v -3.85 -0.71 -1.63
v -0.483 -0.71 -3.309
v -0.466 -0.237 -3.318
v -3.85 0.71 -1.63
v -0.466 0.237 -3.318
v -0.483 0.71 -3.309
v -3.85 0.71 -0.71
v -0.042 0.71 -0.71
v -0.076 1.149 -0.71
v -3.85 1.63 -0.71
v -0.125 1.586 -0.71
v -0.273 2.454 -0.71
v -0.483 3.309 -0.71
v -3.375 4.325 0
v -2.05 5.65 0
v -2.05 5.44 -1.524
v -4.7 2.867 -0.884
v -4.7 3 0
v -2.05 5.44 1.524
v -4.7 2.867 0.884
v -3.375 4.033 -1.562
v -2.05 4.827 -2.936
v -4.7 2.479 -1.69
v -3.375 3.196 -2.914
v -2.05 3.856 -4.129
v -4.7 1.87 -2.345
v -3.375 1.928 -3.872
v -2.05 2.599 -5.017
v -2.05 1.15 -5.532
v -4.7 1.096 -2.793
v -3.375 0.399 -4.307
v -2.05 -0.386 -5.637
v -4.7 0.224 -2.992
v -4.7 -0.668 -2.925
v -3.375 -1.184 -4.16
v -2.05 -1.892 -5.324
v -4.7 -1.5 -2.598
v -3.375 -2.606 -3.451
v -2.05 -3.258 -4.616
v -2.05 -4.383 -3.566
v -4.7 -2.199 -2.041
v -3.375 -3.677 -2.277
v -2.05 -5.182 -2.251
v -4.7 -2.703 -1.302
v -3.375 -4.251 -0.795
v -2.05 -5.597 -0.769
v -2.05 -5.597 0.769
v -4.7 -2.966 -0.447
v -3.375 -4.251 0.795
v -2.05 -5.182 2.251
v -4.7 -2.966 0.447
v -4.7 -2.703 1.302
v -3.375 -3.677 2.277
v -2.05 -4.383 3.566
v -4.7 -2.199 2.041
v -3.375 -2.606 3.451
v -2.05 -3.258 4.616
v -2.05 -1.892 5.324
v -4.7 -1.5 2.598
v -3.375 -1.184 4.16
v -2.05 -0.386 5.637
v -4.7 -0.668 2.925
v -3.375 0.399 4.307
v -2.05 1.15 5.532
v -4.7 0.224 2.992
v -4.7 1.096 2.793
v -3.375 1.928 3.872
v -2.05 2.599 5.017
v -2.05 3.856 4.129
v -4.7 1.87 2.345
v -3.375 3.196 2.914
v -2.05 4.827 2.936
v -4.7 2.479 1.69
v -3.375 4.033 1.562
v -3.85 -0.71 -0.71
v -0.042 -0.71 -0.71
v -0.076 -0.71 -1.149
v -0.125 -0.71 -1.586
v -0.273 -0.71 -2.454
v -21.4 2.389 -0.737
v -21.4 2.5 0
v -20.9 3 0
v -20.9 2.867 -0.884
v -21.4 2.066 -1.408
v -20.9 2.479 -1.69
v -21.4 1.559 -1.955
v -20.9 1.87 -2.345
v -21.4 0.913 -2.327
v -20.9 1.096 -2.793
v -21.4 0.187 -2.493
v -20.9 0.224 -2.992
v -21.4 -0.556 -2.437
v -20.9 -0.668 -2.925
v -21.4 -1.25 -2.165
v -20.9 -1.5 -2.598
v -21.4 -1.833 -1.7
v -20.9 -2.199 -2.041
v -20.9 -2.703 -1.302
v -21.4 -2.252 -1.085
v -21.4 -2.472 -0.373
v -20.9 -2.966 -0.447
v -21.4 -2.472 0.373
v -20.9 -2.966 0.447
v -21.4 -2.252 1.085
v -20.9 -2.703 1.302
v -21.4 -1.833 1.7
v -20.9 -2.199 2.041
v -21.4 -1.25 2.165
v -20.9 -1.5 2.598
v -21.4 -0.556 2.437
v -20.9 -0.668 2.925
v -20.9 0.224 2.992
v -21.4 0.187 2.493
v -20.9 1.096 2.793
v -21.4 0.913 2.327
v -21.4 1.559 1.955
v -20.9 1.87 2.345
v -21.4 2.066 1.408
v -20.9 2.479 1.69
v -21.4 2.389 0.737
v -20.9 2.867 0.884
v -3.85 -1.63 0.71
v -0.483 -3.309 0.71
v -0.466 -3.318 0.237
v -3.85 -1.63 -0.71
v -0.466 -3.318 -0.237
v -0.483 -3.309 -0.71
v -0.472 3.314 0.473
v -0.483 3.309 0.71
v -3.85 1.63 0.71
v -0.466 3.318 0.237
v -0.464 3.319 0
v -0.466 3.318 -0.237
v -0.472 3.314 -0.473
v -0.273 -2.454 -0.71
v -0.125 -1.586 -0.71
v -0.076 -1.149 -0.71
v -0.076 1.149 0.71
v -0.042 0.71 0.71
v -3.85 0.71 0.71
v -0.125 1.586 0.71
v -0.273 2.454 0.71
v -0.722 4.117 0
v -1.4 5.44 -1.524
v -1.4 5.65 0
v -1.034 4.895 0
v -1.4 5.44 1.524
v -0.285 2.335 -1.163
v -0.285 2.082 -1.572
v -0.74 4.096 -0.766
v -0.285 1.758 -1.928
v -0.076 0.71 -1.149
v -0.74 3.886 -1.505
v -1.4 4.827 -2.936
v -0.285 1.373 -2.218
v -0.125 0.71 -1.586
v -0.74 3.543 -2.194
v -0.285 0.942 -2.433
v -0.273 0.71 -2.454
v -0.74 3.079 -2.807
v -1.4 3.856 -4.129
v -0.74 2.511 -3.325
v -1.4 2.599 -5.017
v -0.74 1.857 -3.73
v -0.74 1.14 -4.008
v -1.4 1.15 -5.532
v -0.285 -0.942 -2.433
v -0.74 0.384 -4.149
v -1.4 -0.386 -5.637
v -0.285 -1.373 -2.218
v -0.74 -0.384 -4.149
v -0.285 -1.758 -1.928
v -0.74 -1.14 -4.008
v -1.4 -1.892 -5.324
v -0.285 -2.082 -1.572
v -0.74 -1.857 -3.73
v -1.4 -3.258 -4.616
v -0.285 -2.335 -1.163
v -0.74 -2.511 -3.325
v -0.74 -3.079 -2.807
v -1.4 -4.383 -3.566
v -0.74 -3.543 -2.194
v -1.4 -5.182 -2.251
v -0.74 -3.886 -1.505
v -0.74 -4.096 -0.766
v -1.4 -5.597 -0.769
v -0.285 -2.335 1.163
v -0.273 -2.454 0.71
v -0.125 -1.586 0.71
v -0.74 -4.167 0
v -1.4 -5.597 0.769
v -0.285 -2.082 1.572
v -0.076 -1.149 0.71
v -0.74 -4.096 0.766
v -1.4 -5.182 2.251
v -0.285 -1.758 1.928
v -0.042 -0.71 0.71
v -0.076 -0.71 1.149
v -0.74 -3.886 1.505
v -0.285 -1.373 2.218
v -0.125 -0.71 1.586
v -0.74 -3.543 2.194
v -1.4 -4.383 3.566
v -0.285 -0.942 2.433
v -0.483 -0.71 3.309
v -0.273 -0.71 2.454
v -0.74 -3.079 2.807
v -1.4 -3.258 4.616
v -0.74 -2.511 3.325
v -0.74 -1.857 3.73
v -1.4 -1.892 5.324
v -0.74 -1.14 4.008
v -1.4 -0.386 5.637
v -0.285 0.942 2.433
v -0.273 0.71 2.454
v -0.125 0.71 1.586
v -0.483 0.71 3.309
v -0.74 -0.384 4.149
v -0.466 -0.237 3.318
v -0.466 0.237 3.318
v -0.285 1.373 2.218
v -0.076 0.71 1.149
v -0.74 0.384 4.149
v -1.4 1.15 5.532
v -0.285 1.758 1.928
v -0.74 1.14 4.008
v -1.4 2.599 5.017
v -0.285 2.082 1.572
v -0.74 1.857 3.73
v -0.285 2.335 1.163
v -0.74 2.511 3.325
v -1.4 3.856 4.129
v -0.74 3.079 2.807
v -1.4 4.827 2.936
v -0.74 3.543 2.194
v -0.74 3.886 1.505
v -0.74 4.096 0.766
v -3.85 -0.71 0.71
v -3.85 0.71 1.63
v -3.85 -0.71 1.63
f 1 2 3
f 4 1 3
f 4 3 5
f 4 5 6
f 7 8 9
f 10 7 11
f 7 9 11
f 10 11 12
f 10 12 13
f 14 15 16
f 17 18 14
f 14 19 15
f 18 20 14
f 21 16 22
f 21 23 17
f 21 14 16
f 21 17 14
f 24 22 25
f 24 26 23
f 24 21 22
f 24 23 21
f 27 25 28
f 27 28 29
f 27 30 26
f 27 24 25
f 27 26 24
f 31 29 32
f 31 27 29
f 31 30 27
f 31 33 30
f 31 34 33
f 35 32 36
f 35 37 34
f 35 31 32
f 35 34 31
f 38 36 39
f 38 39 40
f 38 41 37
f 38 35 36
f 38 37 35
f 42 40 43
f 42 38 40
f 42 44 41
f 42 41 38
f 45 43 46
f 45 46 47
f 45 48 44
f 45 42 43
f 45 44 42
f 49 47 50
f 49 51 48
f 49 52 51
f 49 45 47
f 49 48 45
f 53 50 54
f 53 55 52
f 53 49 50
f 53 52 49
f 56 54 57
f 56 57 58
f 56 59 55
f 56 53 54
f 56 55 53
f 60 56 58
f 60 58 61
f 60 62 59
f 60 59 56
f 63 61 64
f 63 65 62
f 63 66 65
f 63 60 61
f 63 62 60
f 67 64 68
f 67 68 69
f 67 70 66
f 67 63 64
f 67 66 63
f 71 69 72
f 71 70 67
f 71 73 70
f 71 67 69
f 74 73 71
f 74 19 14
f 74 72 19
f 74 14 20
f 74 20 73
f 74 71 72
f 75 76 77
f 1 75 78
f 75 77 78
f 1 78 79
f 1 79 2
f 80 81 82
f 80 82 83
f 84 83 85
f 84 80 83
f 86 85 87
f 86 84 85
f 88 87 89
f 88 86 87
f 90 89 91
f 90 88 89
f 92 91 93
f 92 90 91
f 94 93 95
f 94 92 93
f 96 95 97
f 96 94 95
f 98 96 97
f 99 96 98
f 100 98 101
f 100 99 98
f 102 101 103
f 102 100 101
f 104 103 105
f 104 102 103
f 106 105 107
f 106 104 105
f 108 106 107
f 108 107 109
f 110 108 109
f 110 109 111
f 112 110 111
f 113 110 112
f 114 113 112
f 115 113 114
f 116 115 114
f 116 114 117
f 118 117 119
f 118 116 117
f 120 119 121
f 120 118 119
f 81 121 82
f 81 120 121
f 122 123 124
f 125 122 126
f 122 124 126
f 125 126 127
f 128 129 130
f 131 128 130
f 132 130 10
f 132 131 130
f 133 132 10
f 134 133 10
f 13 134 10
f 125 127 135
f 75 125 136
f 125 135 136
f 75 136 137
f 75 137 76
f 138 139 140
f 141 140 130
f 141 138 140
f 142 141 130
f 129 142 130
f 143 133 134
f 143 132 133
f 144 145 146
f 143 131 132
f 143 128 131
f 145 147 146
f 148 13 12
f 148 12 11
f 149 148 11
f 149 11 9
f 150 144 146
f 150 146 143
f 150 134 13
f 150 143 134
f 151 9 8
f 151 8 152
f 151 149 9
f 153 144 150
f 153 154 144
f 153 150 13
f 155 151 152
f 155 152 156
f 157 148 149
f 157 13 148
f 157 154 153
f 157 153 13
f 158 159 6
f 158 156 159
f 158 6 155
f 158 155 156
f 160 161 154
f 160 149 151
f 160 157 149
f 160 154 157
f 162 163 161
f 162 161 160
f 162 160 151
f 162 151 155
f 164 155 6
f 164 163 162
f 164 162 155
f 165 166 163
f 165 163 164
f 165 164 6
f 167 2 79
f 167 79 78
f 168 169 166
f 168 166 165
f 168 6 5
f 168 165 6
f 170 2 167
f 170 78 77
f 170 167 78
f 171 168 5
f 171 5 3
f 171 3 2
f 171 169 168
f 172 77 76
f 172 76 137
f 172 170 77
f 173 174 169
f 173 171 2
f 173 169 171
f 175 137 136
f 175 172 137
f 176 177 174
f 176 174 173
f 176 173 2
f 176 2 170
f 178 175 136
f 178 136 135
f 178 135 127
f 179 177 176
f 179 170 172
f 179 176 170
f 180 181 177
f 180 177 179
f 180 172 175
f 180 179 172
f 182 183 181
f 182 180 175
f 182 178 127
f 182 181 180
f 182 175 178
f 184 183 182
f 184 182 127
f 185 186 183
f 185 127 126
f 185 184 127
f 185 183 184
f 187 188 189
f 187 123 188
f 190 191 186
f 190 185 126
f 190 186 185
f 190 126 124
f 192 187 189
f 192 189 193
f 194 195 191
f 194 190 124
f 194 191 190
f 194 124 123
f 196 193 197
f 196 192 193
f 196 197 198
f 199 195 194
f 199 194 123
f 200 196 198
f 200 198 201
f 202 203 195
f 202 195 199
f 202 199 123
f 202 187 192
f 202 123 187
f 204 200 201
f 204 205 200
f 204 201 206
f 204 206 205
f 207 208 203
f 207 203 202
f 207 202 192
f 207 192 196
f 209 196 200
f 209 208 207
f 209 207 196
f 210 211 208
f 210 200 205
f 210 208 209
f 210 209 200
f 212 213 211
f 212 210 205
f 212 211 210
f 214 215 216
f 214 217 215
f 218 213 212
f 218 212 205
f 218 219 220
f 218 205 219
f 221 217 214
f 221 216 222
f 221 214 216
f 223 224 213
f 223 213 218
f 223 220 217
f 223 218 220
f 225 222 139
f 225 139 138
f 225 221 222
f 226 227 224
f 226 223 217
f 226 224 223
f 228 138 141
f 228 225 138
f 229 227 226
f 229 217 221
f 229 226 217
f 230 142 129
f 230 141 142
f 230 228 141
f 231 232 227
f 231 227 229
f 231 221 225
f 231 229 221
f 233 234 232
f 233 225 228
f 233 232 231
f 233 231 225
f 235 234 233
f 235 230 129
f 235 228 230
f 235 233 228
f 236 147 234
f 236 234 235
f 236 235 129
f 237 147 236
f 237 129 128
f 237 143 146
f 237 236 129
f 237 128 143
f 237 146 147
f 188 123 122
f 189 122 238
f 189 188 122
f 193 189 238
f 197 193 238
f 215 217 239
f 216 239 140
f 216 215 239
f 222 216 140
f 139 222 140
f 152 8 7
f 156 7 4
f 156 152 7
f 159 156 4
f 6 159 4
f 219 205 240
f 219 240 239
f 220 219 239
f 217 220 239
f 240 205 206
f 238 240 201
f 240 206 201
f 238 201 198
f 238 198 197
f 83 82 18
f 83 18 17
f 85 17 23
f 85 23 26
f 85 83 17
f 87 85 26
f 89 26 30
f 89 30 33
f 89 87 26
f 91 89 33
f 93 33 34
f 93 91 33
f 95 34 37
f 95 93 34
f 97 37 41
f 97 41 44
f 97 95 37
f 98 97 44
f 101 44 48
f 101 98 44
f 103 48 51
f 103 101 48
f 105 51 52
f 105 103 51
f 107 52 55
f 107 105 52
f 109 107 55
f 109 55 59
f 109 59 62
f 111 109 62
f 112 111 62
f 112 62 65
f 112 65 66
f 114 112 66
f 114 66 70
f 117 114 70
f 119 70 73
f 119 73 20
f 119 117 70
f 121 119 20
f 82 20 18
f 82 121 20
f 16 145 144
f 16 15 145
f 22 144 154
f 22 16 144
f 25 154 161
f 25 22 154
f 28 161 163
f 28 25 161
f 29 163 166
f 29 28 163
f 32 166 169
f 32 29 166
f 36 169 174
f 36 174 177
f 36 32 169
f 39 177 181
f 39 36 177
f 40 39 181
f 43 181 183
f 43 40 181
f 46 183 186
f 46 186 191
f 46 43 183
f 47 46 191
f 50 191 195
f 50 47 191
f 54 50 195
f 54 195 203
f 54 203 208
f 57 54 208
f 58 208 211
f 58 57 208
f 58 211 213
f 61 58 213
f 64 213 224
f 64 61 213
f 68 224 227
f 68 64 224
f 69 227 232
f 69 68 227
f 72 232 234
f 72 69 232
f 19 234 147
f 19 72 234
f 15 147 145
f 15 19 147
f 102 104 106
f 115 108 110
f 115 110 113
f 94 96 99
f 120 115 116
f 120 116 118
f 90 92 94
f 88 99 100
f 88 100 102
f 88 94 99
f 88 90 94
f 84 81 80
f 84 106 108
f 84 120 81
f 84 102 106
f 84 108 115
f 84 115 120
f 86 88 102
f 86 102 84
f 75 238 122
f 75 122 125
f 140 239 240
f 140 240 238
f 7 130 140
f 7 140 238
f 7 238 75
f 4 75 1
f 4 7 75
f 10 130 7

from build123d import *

# Parameters (mm, degrees)
SKETCH2_W          = 1.42
SKETCH2_H          = 2.84
SKETCH2_W_2        = 2.84
SKETCH2_H_2        = 1.42
CUT_EXTRUDE1_DEPTH = 3.85
DRAFT1_ANGLE       = 26.5
CHAMFER1_SIZE      = 0.5


with BuildPart() as part:
    # Sketch1 → Revolve1 (revolve)
    with BuildSketch(Plane.XY):
        with BuildLine():
            Line((-1.4, 5.65), (-2.05, 5.65))
            Line((-2.05, 5.65), (-4.7, 3))
            Line((-4.7, 3), (-21.4, 3))
            Line((-21.4, 3), (-21.4, 0))
            Line((-21.4, 0), (0, 0))
            ThreePointArc((0, 0), (-0.355213526, 2.910433816), (-1.4, 5.65))
        make_face()
    revolve(axis=Axis((0, 0, 0), (-1, 0, 0)))

    # Sketch2 → Cut-Extrude1 (cut)
    with BuildSketch(Plane(origin=(0, 0, 0), x_dir=(0, 0, -1), z_dir=(1, 0, 0))):
        with Locations((0, 2.13)):
            Rectangle(SKETCH2_W, SKETCH2_H)
        with Locations((-2.13, 0)):
            Rectangle(SKETCH2_W_2, SKETCH2_H_2)
        Rectangle(SKETCH2_W, SKETCH2_H_2)
        with Locations((2.13, 0)):
            Rectangle(SKETCH2_W_2, SKETCH2_H_2)
        with Locations((0, -2.13)):
            Rectangle(SKETCH2_W, SKETCH2_H)
    extrude(amount=-CUT_EXTRUDE1_DEPTH, mode=Mode.SUBTRACT)

    # Draft1
    draft1_faces = [part.faces().sort_by_distance(p)[0] for p in [
        (-2.194846815, -3.55, 0),
        (-2.194846815, 0, 3.55),
        (-2.194846815, 0, -3.55),
        (-2.194846815, 3.55, 0),
    ]]
    draft(draft1_faces, Plane(origin=(0, 0, 0), x_dir=(0, 0, 1), z_dir=(1, 0, 0)), DRAFT1_ANGLE)

    # Chamfer1
    chamfer1_edges = [part.edges().sort_by_distance(p)[0] for p in [
        (-21.4, -3, 0),
    ]]
    chamfer(chamfer1_edges, length=CHAMFER1_SIZE)


solid = part.part
